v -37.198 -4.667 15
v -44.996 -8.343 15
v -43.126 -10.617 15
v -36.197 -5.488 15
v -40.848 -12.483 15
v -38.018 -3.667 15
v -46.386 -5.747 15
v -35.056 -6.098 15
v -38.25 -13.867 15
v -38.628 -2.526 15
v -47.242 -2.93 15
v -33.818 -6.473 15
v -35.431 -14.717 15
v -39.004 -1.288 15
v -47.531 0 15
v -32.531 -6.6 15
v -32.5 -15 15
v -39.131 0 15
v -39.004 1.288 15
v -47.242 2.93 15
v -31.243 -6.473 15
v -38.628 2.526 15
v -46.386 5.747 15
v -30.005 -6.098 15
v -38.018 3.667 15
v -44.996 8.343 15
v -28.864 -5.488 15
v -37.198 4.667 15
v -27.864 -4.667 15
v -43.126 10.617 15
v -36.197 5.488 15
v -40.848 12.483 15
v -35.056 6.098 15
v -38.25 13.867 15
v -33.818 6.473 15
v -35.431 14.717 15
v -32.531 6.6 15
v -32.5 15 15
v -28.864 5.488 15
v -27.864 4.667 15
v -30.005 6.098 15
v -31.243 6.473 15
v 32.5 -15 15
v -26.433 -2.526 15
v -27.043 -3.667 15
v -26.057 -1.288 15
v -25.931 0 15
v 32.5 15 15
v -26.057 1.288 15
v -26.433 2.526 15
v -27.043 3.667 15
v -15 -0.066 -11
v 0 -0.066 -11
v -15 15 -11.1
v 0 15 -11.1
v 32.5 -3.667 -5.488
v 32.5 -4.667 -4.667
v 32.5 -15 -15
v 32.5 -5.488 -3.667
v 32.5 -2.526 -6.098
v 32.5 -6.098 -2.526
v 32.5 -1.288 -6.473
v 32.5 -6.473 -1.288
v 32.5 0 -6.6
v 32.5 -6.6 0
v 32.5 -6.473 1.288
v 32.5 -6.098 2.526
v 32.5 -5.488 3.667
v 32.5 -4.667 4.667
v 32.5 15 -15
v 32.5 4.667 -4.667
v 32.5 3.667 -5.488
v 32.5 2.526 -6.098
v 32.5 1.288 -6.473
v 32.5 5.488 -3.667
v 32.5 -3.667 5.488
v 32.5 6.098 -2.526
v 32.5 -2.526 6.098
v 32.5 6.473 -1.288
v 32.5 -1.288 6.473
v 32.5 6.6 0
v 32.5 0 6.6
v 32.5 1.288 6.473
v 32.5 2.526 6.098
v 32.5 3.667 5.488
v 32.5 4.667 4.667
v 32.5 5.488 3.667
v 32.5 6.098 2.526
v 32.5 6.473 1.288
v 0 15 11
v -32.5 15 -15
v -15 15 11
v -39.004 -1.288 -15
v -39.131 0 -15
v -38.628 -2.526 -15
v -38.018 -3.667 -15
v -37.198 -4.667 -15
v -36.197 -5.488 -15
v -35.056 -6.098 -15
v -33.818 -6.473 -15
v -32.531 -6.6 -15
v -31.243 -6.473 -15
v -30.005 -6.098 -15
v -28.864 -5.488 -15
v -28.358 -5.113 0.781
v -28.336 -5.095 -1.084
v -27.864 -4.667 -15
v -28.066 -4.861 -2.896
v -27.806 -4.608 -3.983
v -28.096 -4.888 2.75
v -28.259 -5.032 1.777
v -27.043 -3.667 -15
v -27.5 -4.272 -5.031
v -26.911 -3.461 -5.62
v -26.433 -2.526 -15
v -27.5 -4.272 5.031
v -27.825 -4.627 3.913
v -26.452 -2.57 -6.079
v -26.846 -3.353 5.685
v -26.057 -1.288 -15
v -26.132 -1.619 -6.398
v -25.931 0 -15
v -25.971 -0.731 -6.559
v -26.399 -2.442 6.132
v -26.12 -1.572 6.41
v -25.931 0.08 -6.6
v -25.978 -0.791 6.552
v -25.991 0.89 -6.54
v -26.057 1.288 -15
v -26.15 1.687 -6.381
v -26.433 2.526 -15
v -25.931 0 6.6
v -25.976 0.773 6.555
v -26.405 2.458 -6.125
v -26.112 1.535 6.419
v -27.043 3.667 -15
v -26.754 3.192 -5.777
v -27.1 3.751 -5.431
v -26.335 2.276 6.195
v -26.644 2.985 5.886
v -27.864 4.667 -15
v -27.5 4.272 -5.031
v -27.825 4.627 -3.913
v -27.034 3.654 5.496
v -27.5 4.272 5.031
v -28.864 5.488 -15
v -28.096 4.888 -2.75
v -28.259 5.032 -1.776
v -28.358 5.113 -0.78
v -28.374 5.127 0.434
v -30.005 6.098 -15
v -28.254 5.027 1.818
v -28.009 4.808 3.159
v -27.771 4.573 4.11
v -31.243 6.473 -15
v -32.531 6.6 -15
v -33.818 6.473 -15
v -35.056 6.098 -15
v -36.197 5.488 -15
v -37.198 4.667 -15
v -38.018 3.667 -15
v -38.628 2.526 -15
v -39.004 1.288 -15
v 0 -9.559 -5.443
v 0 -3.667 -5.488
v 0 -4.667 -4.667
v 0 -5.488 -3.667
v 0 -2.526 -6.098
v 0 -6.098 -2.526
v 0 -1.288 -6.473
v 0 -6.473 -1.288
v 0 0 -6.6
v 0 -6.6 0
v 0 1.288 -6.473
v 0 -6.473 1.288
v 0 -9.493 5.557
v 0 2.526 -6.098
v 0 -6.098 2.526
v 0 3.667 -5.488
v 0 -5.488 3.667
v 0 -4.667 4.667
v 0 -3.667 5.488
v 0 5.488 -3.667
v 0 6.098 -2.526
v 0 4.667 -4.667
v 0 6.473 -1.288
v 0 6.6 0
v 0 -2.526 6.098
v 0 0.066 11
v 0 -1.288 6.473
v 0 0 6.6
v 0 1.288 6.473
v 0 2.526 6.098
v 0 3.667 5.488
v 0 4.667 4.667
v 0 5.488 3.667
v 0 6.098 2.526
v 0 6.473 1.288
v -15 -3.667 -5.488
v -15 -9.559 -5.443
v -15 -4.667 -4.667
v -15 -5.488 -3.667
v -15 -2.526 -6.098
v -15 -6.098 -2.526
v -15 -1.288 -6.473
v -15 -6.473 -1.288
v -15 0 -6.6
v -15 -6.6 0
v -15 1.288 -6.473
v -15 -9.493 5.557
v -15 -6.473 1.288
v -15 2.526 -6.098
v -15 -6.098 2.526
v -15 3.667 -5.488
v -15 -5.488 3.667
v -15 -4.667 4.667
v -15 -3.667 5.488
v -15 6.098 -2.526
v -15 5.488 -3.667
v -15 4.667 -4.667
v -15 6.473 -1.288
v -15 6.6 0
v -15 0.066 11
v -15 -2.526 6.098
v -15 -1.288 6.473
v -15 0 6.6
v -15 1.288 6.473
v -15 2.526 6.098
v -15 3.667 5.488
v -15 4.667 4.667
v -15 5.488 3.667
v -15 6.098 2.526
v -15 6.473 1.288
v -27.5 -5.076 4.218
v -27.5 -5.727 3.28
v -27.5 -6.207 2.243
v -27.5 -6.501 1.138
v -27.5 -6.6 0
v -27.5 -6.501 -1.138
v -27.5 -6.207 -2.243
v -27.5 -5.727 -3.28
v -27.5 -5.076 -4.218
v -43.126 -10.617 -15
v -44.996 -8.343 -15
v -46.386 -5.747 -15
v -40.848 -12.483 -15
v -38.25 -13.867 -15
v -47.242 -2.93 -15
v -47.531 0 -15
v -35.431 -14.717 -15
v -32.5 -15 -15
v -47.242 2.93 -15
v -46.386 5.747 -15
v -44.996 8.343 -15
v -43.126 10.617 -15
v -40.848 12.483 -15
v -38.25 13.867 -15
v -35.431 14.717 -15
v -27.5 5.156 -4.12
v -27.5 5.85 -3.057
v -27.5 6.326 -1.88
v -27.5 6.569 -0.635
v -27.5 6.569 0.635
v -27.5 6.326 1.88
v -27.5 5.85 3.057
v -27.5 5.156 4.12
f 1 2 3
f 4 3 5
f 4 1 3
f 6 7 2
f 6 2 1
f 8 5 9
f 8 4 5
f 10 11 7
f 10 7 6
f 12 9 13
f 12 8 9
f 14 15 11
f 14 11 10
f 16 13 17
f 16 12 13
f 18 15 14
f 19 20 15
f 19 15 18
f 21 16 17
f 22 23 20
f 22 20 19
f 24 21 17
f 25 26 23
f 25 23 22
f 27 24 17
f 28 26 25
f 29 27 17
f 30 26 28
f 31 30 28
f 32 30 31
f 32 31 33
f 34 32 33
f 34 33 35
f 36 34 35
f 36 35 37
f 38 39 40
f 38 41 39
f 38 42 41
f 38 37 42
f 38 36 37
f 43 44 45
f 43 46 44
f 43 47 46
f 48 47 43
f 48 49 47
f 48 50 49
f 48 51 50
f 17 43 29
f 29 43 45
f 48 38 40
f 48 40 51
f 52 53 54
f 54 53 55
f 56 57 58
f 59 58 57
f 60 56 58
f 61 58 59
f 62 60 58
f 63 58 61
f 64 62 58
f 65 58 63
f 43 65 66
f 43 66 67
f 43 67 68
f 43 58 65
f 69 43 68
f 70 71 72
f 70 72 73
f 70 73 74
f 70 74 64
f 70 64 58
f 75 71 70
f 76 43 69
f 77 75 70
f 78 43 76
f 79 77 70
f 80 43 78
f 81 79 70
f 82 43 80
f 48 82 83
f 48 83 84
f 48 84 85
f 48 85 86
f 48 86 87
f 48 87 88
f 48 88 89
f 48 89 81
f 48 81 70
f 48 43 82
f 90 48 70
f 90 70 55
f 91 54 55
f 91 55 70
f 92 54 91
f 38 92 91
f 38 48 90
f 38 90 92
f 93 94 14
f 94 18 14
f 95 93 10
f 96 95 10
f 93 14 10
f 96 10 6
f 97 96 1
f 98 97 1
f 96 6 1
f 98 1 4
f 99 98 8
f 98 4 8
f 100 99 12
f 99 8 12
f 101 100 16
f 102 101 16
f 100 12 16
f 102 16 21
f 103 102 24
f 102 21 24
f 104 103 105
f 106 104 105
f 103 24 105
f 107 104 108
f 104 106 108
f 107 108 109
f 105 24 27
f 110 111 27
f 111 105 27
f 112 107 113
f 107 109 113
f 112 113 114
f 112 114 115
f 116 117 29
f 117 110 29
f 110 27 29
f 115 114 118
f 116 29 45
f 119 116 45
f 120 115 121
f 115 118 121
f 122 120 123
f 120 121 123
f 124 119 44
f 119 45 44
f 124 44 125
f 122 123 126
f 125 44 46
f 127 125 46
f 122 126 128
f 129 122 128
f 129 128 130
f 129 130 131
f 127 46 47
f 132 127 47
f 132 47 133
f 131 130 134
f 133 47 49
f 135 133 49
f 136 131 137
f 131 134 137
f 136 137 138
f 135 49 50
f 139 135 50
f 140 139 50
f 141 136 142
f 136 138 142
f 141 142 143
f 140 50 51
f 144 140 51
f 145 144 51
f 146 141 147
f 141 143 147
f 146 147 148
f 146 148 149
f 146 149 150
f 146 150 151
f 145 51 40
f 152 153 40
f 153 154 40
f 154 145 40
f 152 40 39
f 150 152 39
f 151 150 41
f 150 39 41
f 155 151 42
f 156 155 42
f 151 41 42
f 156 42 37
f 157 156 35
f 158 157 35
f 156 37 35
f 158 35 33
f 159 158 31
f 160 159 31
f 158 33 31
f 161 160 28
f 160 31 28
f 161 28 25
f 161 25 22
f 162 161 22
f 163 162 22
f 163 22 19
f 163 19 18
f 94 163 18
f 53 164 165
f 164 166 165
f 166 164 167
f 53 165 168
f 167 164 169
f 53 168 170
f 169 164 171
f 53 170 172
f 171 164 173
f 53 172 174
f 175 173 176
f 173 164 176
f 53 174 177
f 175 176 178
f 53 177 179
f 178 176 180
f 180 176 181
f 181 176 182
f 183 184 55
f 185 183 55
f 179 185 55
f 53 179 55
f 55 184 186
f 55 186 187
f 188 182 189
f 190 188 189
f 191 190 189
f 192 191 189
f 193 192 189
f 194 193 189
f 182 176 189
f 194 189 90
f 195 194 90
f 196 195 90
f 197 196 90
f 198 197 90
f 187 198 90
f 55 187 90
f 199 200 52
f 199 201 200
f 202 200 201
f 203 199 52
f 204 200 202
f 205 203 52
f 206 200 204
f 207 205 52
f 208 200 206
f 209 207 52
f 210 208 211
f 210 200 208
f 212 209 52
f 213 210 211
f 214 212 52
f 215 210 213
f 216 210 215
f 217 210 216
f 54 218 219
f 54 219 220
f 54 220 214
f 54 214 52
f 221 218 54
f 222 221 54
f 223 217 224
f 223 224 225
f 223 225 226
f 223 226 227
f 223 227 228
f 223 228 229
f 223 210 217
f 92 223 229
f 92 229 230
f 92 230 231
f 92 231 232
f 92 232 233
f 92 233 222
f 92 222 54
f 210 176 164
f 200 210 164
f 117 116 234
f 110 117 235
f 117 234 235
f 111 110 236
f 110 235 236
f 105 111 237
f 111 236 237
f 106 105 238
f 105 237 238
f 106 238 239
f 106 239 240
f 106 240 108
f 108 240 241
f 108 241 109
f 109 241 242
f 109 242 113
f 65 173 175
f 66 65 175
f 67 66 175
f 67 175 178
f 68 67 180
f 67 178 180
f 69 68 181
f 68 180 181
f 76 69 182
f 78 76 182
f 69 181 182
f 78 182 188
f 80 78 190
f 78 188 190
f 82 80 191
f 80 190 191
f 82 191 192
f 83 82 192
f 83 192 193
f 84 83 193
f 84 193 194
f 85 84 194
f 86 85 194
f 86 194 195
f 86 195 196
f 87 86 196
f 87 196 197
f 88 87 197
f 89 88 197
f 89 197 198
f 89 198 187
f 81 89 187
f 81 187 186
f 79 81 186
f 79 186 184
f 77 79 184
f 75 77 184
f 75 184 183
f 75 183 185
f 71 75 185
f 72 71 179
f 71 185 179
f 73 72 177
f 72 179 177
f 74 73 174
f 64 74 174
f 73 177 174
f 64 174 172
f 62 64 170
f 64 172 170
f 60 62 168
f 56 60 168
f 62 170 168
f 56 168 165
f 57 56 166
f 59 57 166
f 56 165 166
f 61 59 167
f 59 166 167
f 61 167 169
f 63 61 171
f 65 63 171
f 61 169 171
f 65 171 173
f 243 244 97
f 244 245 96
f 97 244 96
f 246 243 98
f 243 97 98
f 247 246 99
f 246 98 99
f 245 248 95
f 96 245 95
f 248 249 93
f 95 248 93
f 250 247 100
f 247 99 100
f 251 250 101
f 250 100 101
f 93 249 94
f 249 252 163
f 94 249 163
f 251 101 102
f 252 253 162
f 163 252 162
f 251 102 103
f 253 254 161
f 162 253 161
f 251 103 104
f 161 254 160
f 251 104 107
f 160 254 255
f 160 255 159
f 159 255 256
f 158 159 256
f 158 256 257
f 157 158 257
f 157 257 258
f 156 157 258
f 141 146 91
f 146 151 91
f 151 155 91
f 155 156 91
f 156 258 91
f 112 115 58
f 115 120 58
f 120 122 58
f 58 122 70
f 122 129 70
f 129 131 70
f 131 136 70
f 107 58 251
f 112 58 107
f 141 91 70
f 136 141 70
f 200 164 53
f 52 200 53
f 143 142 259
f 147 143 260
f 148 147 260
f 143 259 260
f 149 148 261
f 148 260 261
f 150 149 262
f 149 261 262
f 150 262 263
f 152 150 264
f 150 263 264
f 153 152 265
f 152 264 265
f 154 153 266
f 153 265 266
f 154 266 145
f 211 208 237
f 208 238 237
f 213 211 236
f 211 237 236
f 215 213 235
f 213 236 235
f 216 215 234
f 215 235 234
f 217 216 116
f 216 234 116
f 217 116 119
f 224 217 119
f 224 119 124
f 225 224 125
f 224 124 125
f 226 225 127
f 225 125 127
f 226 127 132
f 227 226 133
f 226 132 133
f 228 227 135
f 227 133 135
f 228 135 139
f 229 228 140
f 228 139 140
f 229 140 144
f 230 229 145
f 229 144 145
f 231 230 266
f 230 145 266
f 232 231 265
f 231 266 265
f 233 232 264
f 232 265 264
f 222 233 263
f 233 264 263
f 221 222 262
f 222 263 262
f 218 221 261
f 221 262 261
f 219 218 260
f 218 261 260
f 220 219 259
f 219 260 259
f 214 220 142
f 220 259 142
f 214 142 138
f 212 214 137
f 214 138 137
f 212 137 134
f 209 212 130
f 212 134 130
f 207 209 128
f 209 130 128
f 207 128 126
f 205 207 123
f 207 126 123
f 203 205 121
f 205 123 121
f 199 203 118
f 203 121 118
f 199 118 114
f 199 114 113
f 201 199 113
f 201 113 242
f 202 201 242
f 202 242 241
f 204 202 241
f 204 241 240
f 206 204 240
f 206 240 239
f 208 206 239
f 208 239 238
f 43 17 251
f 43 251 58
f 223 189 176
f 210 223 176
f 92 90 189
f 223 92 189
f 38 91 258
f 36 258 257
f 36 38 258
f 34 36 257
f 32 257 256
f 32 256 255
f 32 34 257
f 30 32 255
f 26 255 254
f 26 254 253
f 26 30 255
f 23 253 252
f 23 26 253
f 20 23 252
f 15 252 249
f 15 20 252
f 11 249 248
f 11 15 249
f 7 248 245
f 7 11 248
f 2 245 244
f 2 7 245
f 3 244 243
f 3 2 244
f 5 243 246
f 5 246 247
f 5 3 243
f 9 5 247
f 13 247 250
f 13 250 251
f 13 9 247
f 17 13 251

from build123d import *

# Parameters (mm, degrees)
F1_DEPTH       = 15
F3_DEPTH       = 15
F5_D           = 13.2
F5_DEPTH       = 60
F5_CBORE_D     = 19.25
F5_CBORE_DEPTH = 0
F5_TIP         = 3.9656800856
F7_D           = 13.2
F7_DEPTH       = 60
F7_CBORE_D     = 19.25
F7_CBORE_DEPTH = 0
F7_TIP         = 3.9656800856


# Not quite as in the source:
# - ends of sketch curves that miss each other by under 0.0002 mm in the source are joined


with BuildPart() as f1:
    # F0 (on Top) → F1 (new body, symmetric)
    with BuildSketch(Plane.XY):
        with BuildLine():
            Line((-32.5, -15), (-32.5, 15))
            ThreePointArc((-32.5, 15), (-47.5306145724, 0), (-32.5, -15))
        make_face()
        with BuildLine():
            ThreePointArc((-32.5000000638, -14.9999687584), (-21.9131945085, -10.595772326), (-17.5306145724, 0))
            ThreePointArc((-17.5306145724, 0), (-21.9131945085, 10.595772326), (-32.5000000638, 14.9999687584))
            Line((-32.5000000638, 14.9999687584), (-32.5000000638, -14.9999687584))
        make_face()
        with BuildLine():
            ThreePointArc((-32.5000000638, 14.9999687584), (-21.9131945085, 10.595772326), (-17.5306145724, 0))
            ThreePointArc((-17.5306145724, 0), (-21.9131945085, -10.595772326), (-32.5000000638, -14.9999687584))
            Line((-32.5000000638, -14.9999687584), (32.5, -15))
            Line((32.5, -15), (32.5, 15))
            Line((32.5, 15), (-32.5000000638, 14.9999687584))
        make_face()
    extrude(amount=F1_DEPTH, both=True)

    # F2 (on Right) → F3 (cut)
    with BuildSketch(Plane.YZ):
        Polygon((9.5593853593, 5.4426588685), (9.4931735239, -5.5573411315), (-0.0662118354, -11), (17.534378916, -11.1163873225), (17.534378916, 11), (0.0662118354, 11), align=None)
        Polygon((-0.0662118354, -11), (9.4931735239, -5.5573411315), (9.5593853593, 5.4426588685), (0.0662118354, 11), (-9.4931735239, 5.5573411315), (-9.5593853593, -5.4426588685), align=None)
    extrude(amount=-F3_DEPTH, mode=Mode.SUBTRACT)

    # F5
    with Locations(Plane(origin=(0, 0, -15), x_dir=(1, 0, 0), z_dir=(0, 0, -1))):
        with Locations((-32.5306145724, 0)):
            CounterBoreHole(F5_D / 2, F5_CBORE_D / 2, F5_CBORE_DEPTH, depth=F5_DEPTH)
            with Locations((0, 0, -(F5_DEPTH + F5_TIP / 2))):  # 118° drill point
                Cone(0, F5_D / 2, F5_TIP, mode=Mode.SUBTRACT)

    # F7
    with Locations(Plane.YZ.offset(32.5)):
        with Locations((0, 0)):
            CounterBoreHole(F7_D / 2, F7_CBORE_D / 2, F7_CBORE_DEPTH, depth=F7_DEPTH)
            with Locations((0, 0, -(F7_DEPTH + F7_TIP / 2))):  # 118° drill point
                Cone(0, F7_D / 2, F7_TIP, mode=Mode.SUBTRACT)


solid = f1.part
